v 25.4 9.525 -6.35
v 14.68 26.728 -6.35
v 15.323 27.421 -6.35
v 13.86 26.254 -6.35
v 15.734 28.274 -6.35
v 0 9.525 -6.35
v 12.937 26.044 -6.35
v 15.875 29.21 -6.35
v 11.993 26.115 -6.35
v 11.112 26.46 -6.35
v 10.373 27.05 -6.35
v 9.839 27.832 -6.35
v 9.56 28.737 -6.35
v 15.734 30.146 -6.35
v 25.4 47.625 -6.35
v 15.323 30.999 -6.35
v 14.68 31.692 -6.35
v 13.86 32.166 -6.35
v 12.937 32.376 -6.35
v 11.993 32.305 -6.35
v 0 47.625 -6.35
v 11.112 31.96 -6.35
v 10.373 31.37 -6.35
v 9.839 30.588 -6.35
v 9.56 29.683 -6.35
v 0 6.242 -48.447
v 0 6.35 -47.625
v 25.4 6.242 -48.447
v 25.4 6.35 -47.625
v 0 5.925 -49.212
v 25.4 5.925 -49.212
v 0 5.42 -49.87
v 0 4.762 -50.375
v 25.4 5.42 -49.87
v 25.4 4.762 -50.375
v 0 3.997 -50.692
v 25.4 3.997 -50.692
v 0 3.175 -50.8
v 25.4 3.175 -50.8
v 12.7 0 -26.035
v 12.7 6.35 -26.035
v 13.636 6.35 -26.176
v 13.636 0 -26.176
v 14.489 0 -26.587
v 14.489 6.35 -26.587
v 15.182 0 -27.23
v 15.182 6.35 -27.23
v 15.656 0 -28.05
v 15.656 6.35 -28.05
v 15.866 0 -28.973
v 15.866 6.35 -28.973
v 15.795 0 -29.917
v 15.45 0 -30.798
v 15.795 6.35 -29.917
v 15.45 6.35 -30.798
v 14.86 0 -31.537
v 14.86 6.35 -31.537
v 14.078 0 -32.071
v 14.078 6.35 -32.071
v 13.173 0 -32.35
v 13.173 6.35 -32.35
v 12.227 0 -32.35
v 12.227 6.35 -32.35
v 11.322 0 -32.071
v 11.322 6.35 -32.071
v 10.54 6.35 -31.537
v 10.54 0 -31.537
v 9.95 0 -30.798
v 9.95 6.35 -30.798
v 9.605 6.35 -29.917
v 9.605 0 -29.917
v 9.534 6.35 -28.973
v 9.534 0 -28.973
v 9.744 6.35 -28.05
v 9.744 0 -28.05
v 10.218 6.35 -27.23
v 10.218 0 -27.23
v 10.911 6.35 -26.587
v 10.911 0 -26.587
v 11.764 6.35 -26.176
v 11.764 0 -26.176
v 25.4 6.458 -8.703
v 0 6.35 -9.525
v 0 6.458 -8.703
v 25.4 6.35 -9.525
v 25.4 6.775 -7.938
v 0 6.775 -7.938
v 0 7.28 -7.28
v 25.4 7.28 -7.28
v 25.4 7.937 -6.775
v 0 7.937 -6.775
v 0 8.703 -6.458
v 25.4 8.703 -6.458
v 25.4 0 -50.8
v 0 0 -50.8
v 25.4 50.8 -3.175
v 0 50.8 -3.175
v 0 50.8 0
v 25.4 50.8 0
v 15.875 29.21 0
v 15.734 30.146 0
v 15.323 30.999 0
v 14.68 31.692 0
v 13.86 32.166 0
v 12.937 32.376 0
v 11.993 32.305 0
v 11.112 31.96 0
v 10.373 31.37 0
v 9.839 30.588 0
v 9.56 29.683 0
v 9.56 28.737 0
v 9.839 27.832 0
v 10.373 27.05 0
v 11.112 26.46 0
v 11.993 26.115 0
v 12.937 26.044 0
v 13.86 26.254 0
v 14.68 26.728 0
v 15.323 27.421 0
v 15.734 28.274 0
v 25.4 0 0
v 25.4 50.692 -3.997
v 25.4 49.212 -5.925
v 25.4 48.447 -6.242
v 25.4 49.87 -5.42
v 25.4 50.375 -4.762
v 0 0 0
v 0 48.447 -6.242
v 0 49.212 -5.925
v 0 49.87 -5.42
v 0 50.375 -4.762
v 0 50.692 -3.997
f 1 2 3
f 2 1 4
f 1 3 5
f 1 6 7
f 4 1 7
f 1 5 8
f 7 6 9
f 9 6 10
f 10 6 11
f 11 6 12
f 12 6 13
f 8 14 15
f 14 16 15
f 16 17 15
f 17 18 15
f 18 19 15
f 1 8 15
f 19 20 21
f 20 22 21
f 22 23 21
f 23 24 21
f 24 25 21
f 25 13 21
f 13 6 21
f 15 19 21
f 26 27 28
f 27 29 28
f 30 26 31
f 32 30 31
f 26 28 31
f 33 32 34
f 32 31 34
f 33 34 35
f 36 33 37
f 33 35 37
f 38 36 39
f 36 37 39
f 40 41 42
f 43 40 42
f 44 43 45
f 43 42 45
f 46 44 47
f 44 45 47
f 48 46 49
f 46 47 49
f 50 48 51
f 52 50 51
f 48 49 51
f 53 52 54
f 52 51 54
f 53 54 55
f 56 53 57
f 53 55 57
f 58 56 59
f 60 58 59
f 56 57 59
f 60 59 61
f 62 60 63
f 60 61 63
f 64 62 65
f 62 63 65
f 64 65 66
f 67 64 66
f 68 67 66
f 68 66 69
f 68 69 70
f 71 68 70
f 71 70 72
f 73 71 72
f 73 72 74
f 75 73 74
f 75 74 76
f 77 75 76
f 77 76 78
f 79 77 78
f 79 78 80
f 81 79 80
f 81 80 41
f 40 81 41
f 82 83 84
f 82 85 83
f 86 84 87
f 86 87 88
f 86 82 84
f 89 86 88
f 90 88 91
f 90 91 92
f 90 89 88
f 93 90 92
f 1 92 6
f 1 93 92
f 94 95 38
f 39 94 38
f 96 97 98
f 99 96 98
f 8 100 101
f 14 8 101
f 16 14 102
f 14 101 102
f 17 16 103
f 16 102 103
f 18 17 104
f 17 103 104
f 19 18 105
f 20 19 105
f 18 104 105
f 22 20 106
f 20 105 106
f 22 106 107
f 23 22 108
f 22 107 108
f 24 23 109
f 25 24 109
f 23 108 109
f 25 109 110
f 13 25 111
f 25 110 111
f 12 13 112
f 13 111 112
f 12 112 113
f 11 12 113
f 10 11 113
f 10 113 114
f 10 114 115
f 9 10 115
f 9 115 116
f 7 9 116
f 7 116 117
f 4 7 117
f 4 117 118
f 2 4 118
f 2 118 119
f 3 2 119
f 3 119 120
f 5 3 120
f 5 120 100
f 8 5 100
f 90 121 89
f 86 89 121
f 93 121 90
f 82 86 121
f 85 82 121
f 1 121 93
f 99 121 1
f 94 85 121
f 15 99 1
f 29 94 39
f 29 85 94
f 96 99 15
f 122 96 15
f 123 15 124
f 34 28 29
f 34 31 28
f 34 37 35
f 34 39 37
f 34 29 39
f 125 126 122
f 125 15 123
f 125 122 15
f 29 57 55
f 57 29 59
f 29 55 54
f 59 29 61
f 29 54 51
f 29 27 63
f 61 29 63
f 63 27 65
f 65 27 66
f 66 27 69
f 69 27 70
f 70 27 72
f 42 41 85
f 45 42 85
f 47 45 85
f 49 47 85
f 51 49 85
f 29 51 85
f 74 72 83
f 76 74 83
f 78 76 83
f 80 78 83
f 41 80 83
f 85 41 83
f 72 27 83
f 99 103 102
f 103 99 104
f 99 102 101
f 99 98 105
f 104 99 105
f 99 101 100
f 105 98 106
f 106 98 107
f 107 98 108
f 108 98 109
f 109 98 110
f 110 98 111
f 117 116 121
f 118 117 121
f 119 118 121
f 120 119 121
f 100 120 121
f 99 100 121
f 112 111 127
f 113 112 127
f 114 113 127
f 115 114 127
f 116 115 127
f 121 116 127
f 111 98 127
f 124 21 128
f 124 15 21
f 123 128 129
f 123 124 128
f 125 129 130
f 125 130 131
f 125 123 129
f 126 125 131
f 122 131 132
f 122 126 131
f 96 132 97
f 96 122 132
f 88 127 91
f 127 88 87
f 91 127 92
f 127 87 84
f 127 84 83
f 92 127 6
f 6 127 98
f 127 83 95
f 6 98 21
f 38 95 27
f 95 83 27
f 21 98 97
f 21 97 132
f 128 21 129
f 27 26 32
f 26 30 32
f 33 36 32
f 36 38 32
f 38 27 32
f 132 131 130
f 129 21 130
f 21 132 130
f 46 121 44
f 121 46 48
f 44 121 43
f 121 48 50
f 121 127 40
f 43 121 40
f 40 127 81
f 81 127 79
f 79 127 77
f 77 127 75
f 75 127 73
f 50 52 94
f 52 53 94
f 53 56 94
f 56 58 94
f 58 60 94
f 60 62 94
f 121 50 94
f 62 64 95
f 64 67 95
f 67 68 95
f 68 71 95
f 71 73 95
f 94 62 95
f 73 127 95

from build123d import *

# Parameters (mm, degrees)
BOSS_EXTRUDE1_DEPTH = 25.4
CUT_EXTRUDE1_REACH  = 78.2
SKETCH2_R           = 3.175
CUT_EXTRUDE2_REACH  = 74.122
SKETCH3_R           = 3.175
FILLET1_R           = 3.175
FILLET2_R           = 3.175


with BuildPart() as part:
    # Sketch1 → Boss-Extrude1 (new body)
    with BuildSketch(Plane(origin=(0, 0, 0), x_dir=(0, 0, -1), z_dir=(1, 0, 0))):
        Polygon((0, 0), (50.8, 0), (50.8, 6.35), (6.35, 6.35), (6.35, 50.8), (0, 50.8), align=None)
    extrude(amount=BOSS_EXTRUDE1_DEPTH)

    # Sketch2 → Cut-Extrude1 (cut, up to next)
    with BuildSketch(Plane.XY, mode=Mode.PRIVATE) as cut_extrude1_sk1:
        with Locations((12.7, 29.21)):
            Circle(SKETCH2_R)
    cut_extrude1_tool1 = extrude(cut_extrude1_sk1.sketch, amount=-CUT_EXTRUDE1_REACH, mode=Mode.PRIVATE) & part.part
    add(cut_extrude1_tool1.solids().sort_by_distance((12.7, 29.21, 0))[0], mode=Mode.SUBTRACT)

    # Sketch3 → Cut-Extrude2 (cut, up to next)
    with BuildSketch(Plane(origin=(0, 6.35, 0), x_dir=(1, 0, 0), z_dir=(0, 1, 0)), mode=Mode.PRIVATE) as cut_extrude2_sk1:
        with Locations(Location((12.7, 29.21, 0), (0, 0, 270))):
            Circle(SKETCH3_R)
    cut_extrude2_tool1 = extrude(cut_extrude2_sk1.sketch, amount=-CUT_EXTRUDE2_REACH, mode=Mode.PRIVATE) & part.part
    add(cut_extrude2_tool1.solids().sort_by_distance((12.7, 6.35, -29.21))[0], mode=Mode.SUBTRACT)

    # Fillet1
    fillet1_edges = [part.edges().sort_by_distance(p)[0] for p in [
        (12.7, 6.35, -6.35),
    ]]
    fillet(fillet1_edges, radius=FILLET1_R)

    # Fillet2
    fillet2_edges = [part.edges().sort_by_distance(p)[0] for p in [
        (12.7, 50.8, -6.35),
        (12.7, 6.35, -50.8),
    ]]
    fillet(fillet2_edges, radius=FILLET2_R)


solid = part.part
